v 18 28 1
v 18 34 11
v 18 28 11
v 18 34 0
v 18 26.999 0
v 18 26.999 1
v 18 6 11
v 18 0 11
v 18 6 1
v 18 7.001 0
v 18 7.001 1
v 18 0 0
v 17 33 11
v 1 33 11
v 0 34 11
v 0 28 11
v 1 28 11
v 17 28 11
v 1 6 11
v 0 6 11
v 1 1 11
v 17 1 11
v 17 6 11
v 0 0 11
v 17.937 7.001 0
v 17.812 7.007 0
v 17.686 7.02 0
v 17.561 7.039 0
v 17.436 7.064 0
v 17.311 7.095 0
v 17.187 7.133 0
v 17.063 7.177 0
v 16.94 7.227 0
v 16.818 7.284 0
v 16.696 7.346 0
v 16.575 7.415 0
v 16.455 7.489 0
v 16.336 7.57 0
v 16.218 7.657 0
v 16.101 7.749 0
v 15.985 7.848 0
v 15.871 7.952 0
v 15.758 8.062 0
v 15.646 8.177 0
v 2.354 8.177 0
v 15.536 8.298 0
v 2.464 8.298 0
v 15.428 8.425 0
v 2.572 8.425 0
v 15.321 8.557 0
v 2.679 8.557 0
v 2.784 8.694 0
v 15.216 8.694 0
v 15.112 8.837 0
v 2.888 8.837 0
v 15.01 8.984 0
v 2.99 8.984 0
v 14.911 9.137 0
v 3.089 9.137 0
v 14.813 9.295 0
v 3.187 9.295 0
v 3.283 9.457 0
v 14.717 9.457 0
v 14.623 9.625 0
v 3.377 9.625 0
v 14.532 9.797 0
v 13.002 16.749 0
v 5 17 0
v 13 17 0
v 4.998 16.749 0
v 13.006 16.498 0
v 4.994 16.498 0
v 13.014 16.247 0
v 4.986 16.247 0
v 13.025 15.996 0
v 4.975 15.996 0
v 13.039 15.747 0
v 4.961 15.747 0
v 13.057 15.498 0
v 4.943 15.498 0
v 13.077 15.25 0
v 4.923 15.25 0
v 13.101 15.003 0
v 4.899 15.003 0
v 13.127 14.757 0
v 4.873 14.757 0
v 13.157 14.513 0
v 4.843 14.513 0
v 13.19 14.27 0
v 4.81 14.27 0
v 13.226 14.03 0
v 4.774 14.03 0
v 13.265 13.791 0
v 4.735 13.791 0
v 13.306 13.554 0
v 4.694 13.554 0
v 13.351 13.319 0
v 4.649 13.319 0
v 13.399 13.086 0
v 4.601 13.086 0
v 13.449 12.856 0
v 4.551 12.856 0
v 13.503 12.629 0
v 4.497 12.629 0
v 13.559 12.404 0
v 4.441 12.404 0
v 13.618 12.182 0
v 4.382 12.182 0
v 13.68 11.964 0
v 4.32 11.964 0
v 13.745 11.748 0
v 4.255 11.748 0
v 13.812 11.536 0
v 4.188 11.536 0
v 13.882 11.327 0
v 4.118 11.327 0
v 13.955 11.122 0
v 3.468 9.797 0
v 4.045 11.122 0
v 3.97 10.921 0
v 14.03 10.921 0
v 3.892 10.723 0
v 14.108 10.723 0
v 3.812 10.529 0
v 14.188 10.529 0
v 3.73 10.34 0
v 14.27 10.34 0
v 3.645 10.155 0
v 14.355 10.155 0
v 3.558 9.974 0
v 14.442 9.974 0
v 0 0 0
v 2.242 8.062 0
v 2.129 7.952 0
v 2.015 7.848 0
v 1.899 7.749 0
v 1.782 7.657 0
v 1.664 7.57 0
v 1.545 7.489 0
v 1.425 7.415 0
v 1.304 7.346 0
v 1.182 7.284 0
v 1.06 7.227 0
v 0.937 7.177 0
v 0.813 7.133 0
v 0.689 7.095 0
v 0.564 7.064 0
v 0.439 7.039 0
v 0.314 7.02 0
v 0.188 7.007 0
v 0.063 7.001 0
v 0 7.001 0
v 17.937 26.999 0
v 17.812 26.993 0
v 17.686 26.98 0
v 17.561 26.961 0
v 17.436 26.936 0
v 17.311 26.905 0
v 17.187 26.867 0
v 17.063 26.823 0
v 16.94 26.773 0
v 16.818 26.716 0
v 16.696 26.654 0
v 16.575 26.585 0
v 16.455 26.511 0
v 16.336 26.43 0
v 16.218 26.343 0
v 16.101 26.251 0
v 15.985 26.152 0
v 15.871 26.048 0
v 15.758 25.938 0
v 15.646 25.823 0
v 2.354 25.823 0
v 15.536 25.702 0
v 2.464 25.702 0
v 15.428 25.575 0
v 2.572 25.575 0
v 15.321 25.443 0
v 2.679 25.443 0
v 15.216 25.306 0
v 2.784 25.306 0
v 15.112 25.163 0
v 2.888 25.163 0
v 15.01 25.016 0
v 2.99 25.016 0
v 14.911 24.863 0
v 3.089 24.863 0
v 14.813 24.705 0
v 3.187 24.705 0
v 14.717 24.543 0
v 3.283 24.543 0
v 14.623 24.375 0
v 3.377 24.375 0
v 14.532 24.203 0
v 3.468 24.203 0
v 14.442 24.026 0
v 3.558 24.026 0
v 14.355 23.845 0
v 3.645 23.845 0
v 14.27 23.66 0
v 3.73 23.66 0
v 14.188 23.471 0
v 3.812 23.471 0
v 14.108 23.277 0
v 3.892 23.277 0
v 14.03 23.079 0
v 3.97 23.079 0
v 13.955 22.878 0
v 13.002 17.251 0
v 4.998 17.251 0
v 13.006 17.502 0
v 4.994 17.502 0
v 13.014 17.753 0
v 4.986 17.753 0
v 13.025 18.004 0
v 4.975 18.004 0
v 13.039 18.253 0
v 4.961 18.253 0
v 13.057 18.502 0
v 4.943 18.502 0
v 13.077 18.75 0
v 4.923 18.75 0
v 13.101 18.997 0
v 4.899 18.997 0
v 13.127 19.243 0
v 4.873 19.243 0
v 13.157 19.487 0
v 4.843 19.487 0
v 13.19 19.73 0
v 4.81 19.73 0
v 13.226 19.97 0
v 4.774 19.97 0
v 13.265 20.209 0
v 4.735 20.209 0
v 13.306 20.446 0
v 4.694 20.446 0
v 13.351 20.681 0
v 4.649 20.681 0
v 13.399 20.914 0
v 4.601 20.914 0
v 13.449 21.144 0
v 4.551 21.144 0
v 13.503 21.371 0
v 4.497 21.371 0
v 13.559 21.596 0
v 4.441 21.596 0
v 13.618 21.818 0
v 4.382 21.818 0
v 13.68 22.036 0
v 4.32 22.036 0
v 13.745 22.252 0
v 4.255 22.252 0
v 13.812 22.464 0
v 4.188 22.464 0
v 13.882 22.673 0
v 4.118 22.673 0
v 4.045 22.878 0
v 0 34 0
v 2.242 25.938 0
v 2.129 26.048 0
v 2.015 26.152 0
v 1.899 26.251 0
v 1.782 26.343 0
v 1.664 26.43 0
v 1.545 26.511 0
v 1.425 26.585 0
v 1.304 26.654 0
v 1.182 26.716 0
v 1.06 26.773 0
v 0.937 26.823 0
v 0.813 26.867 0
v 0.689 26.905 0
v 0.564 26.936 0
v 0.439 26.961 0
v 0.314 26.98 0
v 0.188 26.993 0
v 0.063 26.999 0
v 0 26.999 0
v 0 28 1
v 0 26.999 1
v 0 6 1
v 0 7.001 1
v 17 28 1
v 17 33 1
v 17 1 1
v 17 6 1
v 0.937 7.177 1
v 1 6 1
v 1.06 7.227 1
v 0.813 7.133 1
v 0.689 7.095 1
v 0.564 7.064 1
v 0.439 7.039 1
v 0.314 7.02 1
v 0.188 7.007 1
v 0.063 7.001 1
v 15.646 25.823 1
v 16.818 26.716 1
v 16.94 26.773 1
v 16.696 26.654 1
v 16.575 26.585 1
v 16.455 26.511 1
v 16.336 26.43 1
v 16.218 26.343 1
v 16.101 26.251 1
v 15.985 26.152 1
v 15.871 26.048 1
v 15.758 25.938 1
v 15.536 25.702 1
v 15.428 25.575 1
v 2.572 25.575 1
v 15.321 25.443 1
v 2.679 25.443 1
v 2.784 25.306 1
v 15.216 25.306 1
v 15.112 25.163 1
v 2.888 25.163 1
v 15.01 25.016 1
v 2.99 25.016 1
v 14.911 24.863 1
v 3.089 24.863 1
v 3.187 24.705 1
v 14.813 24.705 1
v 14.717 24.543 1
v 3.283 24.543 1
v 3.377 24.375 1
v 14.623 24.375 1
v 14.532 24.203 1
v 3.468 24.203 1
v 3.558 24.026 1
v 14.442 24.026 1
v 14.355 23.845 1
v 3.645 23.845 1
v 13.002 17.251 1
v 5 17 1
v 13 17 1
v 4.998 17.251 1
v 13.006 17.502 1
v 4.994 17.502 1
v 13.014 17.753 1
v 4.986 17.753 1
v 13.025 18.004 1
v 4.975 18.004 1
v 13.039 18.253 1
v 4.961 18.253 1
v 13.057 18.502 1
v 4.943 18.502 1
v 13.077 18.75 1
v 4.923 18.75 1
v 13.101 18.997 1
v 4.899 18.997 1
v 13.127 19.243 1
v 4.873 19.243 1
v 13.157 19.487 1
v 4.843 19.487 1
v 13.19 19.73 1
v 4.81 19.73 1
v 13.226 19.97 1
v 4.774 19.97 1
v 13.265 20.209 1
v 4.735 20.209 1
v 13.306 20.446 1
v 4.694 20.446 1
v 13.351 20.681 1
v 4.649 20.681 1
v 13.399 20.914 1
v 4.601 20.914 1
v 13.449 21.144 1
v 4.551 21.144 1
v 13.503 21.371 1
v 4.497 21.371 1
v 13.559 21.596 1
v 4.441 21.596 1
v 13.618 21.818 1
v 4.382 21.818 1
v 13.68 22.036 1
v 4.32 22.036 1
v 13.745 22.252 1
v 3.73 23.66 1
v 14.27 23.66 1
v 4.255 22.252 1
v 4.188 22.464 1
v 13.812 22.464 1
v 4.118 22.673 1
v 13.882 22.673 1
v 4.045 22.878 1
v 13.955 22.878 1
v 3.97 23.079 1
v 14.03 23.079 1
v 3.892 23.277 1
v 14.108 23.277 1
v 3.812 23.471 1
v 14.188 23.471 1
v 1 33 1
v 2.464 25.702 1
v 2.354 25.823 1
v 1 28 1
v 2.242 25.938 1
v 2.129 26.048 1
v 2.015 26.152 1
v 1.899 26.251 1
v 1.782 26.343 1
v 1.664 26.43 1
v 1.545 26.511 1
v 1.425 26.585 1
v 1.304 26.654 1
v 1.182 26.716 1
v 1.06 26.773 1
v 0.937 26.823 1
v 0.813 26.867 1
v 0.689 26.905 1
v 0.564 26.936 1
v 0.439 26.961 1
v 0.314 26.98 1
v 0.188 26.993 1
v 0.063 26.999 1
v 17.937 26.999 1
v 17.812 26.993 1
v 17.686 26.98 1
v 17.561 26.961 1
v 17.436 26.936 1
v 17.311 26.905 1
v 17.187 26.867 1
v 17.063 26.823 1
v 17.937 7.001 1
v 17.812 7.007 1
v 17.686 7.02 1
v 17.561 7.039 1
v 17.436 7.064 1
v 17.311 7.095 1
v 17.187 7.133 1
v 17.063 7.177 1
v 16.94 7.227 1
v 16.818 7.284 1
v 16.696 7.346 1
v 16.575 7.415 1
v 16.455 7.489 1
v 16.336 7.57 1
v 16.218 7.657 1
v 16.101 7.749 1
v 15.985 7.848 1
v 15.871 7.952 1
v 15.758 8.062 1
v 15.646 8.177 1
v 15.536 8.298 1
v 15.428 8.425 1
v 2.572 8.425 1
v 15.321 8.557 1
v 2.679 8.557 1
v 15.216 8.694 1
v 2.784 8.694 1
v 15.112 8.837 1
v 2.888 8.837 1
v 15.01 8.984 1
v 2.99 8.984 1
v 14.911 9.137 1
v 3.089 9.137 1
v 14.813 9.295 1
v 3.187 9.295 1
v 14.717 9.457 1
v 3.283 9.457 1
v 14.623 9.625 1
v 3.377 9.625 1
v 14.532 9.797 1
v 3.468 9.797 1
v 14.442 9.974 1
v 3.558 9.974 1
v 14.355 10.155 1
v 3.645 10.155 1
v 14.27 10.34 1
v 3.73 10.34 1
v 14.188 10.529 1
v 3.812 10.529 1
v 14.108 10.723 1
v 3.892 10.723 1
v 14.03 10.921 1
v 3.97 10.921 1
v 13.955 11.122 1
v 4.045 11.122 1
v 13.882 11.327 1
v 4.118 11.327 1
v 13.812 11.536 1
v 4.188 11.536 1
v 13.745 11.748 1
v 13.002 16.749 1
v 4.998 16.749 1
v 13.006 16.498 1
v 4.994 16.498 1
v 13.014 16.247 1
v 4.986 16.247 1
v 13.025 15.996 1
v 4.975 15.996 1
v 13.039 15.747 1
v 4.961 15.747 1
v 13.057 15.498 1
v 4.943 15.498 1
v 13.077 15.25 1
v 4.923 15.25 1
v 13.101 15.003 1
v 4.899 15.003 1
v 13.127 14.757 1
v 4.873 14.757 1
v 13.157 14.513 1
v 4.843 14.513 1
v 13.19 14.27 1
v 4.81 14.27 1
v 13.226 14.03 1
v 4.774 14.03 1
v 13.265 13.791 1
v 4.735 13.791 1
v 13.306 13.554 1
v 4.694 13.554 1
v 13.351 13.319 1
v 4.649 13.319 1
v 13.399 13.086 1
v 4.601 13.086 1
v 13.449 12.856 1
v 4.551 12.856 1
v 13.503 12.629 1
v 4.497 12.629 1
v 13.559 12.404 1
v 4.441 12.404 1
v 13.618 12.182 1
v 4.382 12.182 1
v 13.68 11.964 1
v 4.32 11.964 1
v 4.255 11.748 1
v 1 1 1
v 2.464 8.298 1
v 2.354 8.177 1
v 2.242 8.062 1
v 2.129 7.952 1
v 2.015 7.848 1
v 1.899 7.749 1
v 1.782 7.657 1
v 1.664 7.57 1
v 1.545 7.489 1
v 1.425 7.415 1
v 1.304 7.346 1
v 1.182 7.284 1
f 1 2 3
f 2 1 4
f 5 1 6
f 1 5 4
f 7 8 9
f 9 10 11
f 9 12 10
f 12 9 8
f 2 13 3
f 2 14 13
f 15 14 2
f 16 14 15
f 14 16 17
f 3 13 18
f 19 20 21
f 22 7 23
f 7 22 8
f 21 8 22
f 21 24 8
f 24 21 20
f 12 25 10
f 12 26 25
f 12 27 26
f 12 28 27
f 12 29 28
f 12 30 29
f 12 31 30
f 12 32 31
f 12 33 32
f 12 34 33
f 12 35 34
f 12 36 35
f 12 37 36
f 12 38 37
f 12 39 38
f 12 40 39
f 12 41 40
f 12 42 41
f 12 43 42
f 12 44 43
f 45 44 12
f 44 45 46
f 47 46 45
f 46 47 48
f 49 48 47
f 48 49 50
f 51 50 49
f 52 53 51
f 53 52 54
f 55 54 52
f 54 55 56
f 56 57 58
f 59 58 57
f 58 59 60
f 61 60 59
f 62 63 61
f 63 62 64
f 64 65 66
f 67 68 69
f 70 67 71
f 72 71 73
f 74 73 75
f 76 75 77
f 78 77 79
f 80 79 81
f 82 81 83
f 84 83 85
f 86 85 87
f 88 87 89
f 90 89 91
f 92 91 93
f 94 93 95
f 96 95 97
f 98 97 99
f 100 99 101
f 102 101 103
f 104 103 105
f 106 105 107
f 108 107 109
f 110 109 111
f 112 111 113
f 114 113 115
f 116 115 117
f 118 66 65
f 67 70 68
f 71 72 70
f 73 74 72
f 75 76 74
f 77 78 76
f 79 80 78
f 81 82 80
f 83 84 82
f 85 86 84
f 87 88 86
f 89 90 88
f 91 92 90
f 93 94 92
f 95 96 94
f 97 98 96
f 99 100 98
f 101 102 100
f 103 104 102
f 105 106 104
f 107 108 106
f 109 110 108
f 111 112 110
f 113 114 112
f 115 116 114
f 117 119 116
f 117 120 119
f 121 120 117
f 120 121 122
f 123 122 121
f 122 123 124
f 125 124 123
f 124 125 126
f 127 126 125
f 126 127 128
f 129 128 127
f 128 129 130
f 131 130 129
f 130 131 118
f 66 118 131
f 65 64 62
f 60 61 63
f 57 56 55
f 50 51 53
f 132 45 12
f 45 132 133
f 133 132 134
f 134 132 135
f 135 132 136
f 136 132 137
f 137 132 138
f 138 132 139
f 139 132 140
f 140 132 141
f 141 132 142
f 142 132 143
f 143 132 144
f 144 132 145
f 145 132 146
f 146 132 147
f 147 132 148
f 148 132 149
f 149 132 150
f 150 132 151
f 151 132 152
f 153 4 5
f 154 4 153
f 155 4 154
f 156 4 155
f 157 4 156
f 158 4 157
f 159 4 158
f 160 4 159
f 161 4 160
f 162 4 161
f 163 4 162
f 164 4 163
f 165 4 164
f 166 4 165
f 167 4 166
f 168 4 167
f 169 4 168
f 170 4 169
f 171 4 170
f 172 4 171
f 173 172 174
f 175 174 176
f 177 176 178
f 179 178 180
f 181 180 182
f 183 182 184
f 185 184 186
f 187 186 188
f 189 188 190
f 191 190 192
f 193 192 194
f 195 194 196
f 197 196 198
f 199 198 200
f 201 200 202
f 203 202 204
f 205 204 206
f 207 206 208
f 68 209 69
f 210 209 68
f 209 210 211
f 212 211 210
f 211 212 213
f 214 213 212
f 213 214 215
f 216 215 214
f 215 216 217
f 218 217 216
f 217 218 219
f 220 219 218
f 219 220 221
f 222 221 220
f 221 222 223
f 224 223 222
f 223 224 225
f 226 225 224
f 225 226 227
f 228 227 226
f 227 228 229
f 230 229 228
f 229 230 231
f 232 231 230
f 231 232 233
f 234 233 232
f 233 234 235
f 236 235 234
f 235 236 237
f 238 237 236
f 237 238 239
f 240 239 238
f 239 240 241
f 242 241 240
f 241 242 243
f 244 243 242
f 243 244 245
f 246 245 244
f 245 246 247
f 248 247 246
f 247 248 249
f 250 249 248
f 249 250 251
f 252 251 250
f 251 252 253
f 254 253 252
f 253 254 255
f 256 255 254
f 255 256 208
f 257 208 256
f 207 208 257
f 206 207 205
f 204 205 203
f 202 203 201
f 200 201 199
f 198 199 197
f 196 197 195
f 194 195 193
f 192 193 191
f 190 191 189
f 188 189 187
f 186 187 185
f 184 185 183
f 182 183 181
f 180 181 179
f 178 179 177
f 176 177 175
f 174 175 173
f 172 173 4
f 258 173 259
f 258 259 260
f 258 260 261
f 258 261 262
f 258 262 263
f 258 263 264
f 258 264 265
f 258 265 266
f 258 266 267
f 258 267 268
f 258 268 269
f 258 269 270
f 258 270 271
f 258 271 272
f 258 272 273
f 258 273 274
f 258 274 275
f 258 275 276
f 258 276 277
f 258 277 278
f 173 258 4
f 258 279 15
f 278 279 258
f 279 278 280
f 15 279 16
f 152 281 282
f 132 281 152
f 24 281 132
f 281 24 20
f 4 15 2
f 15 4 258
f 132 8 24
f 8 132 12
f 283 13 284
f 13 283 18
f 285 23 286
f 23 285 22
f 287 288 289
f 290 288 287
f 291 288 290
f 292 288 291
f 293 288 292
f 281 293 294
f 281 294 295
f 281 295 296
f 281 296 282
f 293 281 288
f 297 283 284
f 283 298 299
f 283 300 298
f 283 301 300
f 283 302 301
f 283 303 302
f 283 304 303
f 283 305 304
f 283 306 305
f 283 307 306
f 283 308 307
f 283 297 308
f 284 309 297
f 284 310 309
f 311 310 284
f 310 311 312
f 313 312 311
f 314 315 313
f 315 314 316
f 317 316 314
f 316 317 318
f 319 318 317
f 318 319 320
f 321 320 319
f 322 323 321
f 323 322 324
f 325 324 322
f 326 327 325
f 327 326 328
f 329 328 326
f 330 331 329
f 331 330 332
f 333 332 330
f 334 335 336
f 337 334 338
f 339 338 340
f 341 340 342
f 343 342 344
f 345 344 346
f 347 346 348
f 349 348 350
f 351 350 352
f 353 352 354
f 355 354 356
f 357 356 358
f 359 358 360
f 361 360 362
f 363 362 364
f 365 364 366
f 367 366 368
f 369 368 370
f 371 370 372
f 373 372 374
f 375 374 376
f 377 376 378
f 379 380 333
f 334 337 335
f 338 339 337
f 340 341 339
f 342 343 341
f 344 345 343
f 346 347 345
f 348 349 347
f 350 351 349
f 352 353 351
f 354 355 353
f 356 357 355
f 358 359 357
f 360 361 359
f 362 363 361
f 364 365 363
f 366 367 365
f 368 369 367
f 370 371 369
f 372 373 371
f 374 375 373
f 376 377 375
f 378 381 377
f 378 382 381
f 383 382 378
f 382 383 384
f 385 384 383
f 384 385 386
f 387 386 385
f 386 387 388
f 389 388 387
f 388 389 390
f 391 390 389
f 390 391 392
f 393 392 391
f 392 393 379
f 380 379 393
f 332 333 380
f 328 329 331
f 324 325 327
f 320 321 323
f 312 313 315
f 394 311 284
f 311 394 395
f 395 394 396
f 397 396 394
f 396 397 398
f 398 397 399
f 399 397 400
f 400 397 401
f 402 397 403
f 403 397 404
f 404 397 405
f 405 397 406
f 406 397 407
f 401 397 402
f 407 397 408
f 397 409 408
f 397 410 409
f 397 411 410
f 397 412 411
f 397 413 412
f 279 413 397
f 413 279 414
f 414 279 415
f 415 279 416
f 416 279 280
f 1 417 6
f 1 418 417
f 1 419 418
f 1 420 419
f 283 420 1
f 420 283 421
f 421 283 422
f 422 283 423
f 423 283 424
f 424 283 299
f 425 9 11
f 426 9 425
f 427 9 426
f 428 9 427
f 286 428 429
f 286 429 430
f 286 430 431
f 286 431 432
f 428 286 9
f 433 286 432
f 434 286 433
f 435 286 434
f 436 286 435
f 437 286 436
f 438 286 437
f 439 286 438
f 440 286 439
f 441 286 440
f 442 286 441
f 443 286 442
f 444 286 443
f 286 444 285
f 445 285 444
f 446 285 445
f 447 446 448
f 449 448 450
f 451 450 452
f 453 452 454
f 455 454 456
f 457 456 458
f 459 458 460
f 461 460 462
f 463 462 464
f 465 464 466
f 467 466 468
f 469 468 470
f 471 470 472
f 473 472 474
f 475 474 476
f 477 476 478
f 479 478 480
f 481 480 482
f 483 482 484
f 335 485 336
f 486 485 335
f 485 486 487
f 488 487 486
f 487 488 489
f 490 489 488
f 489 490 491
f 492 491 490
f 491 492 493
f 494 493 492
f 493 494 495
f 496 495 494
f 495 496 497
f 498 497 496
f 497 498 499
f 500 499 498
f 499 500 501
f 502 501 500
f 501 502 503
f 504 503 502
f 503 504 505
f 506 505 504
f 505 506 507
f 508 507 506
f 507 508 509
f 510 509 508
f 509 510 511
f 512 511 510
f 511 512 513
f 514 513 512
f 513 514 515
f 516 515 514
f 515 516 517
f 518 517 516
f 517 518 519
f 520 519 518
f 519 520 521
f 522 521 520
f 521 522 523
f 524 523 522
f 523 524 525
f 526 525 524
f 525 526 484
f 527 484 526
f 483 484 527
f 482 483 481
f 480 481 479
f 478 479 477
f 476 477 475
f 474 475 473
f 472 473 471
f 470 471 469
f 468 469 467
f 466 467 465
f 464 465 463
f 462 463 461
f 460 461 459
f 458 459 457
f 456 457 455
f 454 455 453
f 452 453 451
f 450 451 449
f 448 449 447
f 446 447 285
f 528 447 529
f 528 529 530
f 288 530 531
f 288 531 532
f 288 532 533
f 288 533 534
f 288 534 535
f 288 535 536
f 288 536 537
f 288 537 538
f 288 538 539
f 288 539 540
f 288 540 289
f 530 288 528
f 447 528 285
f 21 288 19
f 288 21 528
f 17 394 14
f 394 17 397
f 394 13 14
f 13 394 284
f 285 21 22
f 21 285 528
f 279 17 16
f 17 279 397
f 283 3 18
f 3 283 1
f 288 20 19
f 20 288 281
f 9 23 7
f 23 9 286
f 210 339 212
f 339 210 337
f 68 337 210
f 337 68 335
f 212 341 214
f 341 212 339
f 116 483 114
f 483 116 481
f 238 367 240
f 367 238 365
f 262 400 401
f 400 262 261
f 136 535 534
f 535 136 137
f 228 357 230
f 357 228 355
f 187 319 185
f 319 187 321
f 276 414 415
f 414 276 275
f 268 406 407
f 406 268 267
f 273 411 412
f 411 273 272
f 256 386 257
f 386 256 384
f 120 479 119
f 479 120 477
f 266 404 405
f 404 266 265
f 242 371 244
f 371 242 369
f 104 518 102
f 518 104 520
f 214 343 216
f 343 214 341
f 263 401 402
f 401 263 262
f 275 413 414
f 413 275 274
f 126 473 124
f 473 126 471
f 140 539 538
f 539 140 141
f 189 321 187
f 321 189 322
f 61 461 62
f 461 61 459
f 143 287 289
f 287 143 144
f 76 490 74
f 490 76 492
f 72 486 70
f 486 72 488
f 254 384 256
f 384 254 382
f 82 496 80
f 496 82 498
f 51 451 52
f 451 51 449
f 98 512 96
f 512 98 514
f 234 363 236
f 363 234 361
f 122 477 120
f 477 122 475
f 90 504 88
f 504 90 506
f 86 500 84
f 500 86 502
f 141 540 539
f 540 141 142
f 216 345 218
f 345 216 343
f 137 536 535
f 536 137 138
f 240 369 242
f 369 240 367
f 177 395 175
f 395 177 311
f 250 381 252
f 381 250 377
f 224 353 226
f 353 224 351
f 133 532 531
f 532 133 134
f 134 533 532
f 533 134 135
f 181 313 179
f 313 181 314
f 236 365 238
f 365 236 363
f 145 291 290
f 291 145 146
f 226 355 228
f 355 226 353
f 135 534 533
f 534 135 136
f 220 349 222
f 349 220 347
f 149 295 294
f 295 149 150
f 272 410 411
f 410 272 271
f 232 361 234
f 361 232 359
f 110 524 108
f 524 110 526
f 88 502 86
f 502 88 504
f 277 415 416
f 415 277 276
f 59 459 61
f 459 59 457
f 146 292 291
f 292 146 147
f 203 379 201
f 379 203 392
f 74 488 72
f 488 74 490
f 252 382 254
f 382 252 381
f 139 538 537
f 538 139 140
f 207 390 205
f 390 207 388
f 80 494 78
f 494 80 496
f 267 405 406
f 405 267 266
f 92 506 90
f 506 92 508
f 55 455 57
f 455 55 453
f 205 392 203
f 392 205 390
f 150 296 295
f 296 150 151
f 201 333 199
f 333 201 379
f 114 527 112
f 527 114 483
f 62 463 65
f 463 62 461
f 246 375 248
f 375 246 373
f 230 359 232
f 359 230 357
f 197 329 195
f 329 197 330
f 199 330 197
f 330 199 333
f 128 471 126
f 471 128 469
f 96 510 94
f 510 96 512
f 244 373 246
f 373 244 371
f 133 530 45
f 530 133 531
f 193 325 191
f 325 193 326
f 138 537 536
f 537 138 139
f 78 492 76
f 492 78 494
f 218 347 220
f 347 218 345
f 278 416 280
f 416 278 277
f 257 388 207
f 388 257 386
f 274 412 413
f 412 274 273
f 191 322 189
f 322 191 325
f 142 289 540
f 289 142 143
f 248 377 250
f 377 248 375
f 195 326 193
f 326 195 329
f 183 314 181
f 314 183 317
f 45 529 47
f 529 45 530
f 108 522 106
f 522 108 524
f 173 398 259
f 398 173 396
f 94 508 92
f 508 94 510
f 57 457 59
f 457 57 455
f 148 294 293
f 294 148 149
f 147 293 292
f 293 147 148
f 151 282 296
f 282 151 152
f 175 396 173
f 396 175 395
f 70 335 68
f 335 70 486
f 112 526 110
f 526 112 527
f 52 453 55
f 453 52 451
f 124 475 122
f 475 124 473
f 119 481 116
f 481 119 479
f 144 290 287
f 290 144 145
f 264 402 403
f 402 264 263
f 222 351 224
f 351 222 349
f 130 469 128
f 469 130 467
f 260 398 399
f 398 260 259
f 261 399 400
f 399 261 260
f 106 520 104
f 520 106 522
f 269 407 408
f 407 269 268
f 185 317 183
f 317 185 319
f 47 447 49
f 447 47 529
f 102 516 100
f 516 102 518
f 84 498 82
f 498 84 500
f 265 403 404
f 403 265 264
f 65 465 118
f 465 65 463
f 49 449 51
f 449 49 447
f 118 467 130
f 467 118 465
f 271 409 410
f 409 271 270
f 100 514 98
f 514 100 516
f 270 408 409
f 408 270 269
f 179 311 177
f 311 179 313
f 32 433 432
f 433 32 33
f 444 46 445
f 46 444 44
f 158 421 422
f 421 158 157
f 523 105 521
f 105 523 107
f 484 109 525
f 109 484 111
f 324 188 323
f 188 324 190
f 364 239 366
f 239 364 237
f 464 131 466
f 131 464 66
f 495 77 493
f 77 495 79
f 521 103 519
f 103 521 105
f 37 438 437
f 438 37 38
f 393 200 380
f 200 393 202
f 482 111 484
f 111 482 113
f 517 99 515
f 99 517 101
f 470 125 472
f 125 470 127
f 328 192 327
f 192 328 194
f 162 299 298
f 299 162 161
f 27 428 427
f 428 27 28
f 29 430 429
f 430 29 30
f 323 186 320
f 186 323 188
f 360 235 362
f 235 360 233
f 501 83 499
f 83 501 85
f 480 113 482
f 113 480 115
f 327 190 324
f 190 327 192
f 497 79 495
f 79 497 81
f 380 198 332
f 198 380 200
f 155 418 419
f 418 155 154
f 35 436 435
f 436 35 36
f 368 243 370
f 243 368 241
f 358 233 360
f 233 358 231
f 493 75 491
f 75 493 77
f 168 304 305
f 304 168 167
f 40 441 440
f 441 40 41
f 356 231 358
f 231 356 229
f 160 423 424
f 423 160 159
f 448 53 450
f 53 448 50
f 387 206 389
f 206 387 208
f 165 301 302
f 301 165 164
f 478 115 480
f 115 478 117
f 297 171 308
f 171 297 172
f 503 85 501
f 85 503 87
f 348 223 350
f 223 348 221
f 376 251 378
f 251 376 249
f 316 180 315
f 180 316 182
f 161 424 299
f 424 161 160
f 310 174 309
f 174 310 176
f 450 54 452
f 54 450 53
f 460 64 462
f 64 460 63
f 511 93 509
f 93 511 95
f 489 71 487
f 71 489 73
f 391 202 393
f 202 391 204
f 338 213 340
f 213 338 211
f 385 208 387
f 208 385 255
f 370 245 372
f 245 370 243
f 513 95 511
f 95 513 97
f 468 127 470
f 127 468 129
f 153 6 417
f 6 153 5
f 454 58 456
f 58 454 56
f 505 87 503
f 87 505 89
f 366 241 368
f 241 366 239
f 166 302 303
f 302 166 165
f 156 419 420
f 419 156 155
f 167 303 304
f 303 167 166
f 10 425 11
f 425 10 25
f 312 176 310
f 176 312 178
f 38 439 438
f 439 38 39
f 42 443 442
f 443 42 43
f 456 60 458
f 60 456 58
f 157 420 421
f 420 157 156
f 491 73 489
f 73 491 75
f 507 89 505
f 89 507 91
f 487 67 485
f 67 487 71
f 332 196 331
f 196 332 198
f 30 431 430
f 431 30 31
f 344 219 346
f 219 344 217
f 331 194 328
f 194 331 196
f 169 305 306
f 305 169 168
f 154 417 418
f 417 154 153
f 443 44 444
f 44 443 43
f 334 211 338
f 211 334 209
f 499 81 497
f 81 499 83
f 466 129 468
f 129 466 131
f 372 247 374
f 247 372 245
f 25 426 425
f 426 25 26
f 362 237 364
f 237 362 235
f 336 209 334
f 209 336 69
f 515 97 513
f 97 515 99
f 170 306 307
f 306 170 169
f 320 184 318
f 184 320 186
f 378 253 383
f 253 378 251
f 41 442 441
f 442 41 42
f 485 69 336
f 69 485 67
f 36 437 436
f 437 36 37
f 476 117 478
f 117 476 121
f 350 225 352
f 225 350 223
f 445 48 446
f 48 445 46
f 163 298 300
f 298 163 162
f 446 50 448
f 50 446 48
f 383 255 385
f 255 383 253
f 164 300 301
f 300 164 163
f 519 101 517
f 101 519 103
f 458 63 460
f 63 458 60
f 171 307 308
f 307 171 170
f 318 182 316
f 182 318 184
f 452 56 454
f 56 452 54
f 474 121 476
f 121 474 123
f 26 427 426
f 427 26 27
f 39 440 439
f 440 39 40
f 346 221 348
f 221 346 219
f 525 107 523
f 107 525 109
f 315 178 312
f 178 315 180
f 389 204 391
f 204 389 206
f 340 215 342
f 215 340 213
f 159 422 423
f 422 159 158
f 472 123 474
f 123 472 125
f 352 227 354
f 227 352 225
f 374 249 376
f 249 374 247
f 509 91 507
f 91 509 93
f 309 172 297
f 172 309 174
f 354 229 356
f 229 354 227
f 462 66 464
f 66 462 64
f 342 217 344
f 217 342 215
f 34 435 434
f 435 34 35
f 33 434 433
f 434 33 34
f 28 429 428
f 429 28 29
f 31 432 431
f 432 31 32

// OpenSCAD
module Command ( n=5 , x=16 , y=32 , z=2 , f=1 , w=1 , support=5 , finger=5 ) {
	difference() {
		cube([ 2*w+x , 2*w+y , f+(n*z) ]);
		
		translate([w,w,f]) cube([ x,y,f+(n*z) ]); // Token
		
		translate([-0.1 , w+support , f]) cube([2*w+x+0.2 , y-2*support , f+(n*z)]); // Finger
		
		translate([ 0 , w+0.5*y , -0.1 ]) scale([1,2,1]) cylinder(f+0.2,r=finger,$fn=250);
		translate([ 2*w+x , w+0.5*y , -0.1 ]) scale([1,2,1]) cylinder(f+0.2,r=finger,$fn=250);
		
	}	
}

l=1+32; //w+y
for ( i = [ 0 : 0 ] ) translate([ 0 , i*l , 0 ]) Command();
